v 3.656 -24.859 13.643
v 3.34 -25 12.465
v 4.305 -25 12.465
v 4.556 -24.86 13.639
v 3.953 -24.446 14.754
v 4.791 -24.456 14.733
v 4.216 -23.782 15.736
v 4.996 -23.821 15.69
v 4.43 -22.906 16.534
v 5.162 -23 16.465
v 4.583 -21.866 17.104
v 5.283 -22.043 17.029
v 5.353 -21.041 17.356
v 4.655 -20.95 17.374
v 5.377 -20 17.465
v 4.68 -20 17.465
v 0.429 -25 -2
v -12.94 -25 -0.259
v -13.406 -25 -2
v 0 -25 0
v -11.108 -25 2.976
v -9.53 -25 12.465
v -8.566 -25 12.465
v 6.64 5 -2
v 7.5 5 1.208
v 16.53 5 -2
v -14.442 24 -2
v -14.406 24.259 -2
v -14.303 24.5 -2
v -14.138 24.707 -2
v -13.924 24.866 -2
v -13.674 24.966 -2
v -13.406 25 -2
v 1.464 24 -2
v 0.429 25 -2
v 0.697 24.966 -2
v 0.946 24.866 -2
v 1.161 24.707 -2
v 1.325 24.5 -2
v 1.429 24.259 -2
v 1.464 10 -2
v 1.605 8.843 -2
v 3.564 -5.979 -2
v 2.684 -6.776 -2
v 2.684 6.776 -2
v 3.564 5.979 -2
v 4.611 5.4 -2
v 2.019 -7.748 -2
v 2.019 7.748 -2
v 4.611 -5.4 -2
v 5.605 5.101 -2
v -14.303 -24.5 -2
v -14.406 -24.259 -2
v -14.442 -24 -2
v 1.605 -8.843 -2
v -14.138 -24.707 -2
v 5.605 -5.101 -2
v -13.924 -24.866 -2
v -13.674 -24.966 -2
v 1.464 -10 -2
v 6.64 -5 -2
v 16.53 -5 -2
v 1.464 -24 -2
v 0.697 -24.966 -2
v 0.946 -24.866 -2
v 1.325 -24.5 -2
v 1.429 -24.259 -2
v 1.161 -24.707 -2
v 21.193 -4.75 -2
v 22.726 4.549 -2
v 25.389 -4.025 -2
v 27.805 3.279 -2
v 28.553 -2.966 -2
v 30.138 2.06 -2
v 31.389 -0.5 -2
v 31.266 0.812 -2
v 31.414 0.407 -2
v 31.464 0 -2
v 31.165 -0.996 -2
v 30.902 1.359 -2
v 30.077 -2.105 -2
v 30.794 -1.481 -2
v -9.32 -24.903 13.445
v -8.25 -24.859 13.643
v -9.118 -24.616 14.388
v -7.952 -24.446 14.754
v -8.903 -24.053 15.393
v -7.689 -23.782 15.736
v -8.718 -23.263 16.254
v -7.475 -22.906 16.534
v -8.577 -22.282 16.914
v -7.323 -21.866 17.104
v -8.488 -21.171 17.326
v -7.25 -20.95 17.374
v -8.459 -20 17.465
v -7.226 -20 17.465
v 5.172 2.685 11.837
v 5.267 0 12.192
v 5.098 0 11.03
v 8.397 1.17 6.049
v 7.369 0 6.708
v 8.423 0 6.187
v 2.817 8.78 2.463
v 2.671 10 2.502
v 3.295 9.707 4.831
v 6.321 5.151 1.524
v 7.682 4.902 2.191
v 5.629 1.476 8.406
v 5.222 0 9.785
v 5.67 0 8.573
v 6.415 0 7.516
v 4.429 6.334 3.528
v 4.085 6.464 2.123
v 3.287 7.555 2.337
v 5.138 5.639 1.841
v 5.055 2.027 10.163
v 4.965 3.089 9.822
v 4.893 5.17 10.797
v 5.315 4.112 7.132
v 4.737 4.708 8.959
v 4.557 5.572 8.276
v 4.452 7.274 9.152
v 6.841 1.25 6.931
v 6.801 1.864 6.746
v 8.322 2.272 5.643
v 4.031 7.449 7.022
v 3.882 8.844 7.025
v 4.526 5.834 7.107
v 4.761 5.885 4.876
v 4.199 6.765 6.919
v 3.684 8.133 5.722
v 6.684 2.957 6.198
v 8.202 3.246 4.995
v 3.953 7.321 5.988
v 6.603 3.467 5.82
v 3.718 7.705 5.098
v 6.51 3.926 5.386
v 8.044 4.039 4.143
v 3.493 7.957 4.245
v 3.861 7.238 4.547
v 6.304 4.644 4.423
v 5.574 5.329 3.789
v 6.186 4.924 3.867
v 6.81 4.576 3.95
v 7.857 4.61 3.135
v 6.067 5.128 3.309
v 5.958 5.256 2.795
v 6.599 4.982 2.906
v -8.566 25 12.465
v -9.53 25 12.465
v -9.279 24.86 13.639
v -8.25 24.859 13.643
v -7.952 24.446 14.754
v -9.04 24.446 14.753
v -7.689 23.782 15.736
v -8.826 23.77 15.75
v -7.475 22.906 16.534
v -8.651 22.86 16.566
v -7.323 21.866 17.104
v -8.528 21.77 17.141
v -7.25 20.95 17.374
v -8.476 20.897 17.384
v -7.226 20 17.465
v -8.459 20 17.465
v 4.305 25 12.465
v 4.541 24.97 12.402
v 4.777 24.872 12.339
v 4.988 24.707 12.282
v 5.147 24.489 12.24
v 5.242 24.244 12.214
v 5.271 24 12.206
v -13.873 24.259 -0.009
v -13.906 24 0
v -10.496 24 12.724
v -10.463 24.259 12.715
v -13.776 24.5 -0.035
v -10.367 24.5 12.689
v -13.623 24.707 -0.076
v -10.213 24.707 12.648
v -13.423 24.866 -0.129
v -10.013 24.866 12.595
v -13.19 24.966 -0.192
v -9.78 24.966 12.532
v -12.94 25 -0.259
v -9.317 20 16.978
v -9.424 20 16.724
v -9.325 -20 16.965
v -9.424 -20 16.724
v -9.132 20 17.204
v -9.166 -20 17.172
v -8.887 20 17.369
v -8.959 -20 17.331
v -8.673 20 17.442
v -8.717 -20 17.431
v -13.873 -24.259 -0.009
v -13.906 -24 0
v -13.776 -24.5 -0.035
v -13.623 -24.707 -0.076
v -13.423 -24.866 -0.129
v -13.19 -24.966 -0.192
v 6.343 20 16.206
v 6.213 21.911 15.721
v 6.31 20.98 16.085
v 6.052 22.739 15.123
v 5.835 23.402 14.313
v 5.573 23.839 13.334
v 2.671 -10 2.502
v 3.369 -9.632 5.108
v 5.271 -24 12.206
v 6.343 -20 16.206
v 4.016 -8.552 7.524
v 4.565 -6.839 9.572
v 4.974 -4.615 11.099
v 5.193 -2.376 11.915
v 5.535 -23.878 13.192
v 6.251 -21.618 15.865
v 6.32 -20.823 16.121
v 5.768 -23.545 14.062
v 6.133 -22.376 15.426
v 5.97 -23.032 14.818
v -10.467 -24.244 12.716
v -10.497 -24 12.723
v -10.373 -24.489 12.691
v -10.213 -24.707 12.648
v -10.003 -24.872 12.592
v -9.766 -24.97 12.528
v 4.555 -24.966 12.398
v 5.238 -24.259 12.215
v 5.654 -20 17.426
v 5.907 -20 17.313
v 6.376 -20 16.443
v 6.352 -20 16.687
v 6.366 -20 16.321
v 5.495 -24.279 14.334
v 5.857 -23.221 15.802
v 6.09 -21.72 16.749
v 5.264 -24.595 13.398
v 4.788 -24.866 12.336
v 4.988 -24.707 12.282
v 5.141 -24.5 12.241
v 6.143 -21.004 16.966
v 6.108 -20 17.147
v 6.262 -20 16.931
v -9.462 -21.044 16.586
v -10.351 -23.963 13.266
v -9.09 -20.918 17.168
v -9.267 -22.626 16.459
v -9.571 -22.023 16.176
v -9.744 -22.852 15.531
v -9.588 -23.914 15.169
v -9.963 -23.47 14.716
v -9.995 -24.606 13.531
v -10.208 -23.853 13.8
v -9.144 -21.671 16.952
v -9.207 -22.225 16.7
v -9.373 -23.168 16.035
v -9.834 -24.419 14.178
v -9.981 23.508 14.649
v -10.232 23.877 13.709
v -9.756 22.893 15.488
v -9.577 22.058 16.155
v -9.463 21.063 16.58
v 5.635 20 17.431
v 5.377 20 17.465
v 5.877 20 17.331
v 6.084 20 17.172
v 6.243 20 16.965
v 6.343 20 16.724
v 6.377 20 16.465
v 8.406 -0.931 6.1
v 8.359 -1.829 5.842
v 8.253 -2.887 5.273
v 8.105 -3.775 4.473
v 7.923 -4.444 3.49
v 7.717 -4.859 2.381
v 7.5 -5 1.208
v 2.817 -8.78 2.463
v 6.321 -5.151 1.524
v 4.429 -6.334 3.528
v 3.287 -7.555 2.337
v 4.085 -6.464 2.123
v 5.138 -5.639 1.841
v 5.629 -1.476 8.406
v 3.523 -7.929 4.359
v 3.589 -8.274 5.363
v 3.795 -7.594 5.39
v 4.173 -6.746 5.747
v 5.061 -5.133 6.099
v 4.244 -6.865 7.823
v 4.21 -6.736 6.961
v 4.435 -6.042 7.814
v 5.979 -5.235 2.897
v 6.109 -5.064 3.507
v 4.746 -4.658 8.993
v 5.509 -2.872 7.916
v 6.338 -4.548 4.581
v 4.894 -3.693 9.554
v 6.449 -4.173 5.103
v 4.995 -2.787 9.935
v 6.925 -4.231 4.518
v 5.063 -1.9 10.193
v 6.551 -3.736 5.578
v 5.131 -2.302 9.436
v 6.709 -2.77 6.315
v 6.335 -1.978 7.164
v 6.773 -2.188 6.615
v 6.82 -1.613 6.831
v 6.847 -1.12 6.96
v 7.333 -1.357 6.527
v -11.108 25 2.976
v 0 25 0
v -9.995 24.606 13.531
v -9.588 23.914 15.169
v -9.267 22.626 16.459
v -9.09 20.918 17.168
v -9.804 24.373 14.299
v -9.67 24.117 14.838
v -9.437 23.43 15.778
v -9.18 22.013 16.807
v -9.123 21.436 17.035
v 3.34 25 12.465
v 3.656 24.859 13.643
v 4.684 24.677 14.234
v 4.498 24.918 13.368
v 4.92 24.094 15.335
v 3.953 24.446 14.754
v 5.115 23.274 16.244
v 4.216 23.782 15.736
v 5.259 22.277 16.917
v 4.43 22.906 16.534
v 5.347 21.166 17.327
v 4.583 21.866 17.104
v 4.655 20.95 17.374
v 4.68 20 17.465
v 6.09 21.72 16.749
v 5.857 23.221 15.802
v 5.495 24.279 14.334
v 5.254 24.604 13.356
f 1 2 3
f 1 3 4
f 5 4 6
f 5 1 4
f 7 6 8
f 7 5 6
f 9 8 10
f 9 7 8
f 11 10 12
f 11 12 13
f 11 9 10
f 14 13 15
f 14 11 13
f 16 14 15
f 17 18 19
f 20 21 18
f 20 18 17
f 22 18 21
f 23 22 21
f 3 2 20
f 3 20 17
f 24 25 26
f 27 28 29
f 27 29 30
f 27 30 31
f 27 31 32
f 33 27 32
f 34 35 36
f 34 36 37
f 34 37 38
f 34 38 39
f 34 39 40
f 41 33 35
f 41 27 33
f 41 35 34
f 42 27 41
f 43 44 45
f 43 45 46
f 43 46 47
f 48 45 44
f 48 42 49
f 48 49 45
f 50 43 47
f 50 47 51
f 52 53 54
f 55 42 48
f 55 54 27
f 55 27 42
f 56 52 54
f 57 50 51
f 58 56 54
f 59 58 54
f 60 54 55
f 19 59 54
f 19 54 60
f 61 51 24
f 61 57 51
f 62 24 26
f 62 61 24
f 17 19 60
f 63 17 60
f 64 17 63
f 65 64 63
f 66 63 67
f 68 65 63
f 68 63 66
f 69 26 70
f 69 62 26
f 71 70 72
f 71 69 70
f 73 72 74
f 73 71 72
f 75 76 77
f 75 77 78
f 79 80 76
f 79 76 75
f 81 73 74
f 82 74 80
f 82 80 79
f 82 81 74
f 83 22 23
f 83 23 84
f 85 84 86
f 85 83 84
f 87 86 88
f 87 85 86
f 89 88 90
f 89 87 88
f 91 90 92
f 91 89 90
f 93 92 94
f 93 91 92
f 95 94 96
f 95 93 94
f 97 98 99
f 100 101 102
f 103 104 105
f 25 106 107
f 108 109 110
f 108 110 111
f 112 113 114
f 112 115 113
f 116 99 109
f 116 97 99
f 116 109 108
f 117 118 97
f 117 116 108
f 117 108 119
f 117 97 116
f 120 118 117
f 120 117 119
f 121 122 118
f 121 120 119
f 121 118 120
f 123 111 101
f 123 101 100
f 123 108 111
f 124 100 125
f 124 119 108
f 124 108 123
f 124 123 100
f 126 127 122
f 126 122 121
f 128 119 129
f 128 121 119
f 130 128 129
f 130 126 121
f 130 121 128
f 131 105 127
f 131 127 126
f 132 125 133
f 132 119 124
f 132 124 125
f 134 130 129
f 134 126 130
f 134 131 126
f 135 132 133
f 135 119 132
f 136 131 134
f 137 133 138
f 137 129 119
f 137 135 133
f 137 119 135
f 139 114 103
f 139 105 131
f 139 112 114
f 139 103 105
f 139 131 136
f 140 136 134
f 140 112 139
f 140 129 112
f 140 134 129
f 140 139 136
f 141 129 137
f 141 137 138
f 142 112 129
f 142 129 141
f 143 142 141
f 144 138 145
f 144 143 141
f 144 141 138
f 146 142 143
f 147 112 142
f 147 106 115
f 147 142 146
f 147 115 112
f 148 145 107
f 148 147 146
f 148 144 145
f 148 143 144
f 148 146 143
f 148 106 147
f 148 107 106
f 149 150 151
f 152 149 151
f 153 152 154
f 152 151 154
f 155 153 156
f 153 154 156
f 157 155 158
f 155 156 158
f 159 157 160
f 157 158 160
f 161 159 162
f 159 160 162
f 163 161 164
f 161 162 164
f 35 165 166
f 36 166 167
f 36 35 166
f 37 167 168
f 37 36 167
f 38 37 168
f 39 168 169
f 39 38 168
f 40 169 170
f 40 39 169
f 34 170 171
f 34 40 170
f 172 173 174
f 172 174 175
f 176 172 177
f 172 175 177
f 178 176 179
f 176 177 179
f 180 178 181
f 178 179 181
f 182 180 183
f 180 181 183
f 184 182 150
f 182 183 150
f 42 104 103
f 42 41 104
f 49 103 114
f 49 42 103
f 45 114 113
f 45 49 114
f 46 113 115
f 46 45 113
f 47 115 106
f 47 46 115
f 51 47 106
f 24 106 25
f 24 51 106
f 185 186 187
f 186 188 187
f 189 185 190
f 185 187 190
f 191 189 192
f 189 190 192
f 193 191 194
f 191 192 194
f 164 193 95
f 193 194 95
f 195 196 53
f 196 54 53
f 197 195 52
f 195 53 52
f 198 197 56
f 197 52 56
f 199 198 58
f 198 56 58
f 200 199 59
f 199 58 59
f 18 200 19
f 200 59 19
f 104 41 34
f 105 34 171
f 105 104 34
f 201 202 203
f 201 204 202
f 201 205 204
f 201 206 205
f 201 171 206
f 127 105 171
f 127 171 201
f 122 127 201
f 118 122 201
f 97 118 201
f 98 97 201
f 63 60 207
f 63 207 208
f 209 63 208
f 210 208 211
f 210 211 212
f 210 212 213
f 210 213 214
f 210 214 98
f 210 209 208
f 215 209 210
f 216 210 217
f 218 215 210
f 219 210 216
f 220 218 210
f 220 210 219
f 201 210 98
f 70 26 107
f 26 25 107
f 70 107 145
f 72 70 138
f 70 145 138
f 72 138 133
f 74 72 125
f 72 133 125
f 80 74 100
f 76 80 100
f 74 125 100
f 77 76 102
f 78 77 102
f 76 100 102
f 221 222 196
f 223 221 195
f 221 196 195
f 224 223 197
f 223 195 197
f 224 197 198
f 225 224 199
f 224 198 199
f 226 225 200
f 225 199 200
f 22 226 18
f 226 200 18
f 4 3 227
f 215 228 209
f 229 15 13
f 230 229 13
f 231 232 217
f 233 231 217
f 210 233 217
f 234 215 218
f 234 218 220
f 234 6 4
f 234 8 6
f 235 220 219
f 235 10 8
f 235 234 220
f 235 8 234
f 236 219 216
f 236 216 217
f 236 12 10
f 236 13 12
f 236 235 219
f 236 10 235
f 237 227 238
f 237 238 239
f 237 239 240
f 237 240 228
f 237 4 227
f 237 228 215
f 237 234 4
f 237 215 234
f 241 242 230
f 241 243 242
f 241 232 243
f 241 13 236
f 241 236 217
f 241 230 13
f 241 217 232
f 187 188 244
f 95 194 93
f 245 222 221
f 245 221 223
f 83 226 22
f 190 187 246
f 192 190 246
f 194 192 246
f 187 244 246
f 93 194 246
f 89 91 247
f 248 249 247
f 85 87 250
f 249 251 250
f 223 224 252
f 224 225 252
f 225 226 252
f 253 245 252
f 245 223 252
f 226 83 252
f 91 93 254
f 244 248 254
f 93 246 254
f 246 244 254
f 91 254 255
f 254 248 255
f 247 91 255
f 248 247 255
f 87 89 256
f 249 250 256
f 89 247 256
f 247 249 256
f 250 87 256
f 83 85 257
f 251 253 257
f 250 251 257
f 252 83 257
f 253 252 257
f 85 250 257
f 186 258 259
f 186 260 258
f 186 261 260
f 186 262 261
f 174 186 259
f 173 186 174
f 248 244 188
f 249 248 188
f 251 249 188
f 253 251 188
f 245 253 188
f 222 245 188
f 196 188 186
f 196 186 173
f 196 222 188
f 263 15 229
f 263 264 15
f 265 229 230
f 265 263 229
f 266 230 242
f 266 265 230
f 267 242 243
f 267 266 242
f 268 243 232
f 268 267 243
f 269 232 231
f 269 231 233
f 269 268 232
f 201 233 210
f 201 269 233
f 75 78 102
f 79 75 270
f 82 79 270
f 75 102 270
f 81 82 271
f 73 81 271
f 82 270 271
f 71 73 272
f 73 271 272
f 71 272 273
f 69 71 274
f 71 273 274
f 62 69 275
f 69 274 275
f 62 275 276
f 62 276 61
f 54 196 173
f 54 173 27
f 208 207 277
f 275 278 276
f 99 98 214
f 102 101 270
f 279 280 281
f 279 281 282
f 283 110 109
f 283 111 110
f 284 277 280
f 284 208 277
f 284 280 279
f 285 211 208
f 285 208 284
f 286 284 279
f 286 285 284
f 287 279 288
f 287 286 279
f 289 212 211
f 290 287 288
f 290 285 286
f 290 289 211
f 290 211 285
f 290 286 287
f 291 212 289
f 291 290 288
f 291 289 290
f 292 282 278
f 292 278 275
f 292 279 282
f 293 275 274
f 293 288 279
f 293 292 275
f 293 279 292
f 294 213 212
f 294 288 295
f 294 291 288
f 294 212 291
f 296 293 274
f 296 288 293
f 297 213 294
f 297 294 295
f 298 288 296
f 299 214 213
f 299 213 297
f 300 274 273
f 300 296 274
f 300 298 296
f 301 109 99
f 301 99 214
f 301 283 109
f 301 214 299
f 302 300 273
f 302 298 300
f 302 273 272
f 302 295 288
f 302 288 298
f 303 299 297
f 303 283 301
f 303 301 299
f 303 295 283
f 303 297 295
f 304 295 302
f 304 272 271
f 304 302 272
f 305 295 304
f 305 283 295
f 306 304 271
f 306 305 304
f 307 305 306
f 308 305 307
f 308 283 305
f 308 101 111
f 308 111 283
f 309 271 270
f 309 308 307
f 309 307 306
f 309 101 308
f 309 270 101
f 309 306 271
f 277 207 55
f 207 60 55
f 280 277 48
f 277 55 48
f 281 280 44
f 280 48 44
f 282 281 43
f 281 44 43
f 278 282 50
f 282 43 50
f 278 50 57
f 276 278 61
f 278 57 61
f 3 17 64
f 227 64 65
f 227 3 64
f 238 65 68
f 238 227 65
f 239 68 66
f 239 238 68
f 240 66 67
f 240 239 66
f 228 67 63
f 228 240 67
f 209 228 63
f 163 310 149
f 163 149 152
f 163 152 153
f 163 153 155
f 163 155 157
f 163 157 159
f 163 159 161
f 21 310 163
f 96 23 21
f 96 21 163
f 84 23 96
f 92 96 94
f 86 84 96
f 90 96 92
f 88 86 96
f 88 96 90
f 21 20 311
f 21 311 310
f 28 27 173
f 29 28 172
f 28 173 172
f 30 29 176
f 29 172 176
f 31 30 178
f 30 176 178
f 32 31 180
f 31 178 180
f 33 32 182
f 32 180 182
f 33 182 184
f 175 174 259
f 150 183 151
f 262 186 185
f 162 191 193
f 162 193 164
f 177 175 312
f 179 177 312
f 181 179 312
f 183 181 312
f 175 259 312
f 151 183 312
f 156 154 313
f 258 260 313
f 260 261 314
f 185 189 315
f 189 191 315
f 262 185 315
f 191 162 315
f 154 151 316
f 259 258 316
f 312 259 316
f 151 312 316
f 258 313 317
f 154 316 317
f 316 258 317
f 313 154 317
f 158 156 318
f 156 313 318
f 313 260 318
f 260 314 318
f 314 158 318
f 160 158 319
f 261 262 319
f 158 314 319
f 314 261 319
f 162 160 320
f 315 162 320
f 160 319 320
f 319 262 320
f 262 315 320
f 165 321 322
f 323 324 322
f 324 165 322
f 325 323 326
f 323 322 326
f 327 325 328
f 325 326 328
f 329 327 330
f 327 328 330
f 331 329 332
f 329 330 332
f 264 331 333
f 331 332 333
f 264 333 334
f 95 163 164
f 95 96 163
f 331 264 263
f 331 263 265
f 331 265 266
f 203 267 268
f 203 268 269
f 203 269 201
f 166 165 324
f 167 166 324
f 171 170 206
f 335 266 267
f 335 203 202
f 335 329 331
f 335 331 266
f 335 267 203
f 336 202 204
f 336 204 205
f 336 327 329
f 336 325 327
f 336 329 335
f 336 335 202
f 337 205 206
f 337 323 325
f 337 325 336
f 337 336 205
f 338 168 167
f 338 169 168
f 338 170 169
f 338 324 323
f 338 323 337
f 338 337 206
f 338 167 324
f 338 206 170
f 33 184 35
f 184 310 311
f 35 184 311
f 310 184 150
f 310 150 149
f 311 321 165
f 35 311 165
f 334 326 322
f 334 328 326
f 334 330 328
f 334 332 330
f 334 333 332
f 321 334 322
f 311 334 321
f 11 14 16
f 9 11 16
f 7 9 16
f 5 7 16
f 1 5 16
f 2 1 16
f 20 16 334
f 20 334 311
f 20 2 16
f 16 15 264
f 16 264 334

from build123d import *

# Parameters (mm, degrees)
F1_DEPTH = 25
F2_DEPTH = 5
F3_R     = 4.99999
F4_R     = 1


# Not quite as in the source:
# - a fillet or chamfer is up to 0.001 mm smaller than in the source, because OpenCascade refuses the exact size


with BuildPart() as f1:
    # F0 (on Front) → F1 (new body, symmetric)
    with BuildSketch(Plane.XZ):
        Polygon((4.6798147489, 17.465306413), (0, 0), (-11.1081470023, 2.9764190187), (-7.2258613258, 17.465306413), (-9.2258613258, 17.465306413), (-13.9056760747, 0), (-14.4415744596, -2), (1.4641016151, -2), (4.071958182, 7.7326532065), (6.6798147489, 17.465306413), align=None)
    extrude(amount=F1_DEPTH, both=True)

    # F0 (on Front) → F2 (join, symmetric)
    with BuildSketch(Plane.XZ):
        Polygon((31.4641016151, -2), (4.071958182, 7.7326532065), (1.4641016151, -2), align=None)
    extrude(amount=F2_DEPTH, both=True)

    # F3 (radius 5 in the source; OpenCascade refuses exactly that, so slightly less here)
    f3_edges = [f1.edges().sort_by_distance(p)[0] for p in [
        (2.76803, -5, 2.866327),
        (4.071958, 0, 7.732653),
        (2.76803, 5, 2.866327),
        (17.76803, 5, 2.866327),
        (17.76803, -5, 2.866327),
        (5.679815, -25, 17.465306),
        (-8.225861, -25, 17.465306),
        (-8.225861, 25, 17.465306),
        (5.679815, 25, 17.465306),
    ]]
    fillet(f3_edges, radius=F3_R)

    # F4
    f4_edges = [f1.edges().sort_by_distance(p)[0] for p in [
        (-9.225861, 0, 17.465306),
        (6.679815, 0, 17.465306),
    ]]
    fillet(f4_edges, radius=F4_R)


solid = f1.part
